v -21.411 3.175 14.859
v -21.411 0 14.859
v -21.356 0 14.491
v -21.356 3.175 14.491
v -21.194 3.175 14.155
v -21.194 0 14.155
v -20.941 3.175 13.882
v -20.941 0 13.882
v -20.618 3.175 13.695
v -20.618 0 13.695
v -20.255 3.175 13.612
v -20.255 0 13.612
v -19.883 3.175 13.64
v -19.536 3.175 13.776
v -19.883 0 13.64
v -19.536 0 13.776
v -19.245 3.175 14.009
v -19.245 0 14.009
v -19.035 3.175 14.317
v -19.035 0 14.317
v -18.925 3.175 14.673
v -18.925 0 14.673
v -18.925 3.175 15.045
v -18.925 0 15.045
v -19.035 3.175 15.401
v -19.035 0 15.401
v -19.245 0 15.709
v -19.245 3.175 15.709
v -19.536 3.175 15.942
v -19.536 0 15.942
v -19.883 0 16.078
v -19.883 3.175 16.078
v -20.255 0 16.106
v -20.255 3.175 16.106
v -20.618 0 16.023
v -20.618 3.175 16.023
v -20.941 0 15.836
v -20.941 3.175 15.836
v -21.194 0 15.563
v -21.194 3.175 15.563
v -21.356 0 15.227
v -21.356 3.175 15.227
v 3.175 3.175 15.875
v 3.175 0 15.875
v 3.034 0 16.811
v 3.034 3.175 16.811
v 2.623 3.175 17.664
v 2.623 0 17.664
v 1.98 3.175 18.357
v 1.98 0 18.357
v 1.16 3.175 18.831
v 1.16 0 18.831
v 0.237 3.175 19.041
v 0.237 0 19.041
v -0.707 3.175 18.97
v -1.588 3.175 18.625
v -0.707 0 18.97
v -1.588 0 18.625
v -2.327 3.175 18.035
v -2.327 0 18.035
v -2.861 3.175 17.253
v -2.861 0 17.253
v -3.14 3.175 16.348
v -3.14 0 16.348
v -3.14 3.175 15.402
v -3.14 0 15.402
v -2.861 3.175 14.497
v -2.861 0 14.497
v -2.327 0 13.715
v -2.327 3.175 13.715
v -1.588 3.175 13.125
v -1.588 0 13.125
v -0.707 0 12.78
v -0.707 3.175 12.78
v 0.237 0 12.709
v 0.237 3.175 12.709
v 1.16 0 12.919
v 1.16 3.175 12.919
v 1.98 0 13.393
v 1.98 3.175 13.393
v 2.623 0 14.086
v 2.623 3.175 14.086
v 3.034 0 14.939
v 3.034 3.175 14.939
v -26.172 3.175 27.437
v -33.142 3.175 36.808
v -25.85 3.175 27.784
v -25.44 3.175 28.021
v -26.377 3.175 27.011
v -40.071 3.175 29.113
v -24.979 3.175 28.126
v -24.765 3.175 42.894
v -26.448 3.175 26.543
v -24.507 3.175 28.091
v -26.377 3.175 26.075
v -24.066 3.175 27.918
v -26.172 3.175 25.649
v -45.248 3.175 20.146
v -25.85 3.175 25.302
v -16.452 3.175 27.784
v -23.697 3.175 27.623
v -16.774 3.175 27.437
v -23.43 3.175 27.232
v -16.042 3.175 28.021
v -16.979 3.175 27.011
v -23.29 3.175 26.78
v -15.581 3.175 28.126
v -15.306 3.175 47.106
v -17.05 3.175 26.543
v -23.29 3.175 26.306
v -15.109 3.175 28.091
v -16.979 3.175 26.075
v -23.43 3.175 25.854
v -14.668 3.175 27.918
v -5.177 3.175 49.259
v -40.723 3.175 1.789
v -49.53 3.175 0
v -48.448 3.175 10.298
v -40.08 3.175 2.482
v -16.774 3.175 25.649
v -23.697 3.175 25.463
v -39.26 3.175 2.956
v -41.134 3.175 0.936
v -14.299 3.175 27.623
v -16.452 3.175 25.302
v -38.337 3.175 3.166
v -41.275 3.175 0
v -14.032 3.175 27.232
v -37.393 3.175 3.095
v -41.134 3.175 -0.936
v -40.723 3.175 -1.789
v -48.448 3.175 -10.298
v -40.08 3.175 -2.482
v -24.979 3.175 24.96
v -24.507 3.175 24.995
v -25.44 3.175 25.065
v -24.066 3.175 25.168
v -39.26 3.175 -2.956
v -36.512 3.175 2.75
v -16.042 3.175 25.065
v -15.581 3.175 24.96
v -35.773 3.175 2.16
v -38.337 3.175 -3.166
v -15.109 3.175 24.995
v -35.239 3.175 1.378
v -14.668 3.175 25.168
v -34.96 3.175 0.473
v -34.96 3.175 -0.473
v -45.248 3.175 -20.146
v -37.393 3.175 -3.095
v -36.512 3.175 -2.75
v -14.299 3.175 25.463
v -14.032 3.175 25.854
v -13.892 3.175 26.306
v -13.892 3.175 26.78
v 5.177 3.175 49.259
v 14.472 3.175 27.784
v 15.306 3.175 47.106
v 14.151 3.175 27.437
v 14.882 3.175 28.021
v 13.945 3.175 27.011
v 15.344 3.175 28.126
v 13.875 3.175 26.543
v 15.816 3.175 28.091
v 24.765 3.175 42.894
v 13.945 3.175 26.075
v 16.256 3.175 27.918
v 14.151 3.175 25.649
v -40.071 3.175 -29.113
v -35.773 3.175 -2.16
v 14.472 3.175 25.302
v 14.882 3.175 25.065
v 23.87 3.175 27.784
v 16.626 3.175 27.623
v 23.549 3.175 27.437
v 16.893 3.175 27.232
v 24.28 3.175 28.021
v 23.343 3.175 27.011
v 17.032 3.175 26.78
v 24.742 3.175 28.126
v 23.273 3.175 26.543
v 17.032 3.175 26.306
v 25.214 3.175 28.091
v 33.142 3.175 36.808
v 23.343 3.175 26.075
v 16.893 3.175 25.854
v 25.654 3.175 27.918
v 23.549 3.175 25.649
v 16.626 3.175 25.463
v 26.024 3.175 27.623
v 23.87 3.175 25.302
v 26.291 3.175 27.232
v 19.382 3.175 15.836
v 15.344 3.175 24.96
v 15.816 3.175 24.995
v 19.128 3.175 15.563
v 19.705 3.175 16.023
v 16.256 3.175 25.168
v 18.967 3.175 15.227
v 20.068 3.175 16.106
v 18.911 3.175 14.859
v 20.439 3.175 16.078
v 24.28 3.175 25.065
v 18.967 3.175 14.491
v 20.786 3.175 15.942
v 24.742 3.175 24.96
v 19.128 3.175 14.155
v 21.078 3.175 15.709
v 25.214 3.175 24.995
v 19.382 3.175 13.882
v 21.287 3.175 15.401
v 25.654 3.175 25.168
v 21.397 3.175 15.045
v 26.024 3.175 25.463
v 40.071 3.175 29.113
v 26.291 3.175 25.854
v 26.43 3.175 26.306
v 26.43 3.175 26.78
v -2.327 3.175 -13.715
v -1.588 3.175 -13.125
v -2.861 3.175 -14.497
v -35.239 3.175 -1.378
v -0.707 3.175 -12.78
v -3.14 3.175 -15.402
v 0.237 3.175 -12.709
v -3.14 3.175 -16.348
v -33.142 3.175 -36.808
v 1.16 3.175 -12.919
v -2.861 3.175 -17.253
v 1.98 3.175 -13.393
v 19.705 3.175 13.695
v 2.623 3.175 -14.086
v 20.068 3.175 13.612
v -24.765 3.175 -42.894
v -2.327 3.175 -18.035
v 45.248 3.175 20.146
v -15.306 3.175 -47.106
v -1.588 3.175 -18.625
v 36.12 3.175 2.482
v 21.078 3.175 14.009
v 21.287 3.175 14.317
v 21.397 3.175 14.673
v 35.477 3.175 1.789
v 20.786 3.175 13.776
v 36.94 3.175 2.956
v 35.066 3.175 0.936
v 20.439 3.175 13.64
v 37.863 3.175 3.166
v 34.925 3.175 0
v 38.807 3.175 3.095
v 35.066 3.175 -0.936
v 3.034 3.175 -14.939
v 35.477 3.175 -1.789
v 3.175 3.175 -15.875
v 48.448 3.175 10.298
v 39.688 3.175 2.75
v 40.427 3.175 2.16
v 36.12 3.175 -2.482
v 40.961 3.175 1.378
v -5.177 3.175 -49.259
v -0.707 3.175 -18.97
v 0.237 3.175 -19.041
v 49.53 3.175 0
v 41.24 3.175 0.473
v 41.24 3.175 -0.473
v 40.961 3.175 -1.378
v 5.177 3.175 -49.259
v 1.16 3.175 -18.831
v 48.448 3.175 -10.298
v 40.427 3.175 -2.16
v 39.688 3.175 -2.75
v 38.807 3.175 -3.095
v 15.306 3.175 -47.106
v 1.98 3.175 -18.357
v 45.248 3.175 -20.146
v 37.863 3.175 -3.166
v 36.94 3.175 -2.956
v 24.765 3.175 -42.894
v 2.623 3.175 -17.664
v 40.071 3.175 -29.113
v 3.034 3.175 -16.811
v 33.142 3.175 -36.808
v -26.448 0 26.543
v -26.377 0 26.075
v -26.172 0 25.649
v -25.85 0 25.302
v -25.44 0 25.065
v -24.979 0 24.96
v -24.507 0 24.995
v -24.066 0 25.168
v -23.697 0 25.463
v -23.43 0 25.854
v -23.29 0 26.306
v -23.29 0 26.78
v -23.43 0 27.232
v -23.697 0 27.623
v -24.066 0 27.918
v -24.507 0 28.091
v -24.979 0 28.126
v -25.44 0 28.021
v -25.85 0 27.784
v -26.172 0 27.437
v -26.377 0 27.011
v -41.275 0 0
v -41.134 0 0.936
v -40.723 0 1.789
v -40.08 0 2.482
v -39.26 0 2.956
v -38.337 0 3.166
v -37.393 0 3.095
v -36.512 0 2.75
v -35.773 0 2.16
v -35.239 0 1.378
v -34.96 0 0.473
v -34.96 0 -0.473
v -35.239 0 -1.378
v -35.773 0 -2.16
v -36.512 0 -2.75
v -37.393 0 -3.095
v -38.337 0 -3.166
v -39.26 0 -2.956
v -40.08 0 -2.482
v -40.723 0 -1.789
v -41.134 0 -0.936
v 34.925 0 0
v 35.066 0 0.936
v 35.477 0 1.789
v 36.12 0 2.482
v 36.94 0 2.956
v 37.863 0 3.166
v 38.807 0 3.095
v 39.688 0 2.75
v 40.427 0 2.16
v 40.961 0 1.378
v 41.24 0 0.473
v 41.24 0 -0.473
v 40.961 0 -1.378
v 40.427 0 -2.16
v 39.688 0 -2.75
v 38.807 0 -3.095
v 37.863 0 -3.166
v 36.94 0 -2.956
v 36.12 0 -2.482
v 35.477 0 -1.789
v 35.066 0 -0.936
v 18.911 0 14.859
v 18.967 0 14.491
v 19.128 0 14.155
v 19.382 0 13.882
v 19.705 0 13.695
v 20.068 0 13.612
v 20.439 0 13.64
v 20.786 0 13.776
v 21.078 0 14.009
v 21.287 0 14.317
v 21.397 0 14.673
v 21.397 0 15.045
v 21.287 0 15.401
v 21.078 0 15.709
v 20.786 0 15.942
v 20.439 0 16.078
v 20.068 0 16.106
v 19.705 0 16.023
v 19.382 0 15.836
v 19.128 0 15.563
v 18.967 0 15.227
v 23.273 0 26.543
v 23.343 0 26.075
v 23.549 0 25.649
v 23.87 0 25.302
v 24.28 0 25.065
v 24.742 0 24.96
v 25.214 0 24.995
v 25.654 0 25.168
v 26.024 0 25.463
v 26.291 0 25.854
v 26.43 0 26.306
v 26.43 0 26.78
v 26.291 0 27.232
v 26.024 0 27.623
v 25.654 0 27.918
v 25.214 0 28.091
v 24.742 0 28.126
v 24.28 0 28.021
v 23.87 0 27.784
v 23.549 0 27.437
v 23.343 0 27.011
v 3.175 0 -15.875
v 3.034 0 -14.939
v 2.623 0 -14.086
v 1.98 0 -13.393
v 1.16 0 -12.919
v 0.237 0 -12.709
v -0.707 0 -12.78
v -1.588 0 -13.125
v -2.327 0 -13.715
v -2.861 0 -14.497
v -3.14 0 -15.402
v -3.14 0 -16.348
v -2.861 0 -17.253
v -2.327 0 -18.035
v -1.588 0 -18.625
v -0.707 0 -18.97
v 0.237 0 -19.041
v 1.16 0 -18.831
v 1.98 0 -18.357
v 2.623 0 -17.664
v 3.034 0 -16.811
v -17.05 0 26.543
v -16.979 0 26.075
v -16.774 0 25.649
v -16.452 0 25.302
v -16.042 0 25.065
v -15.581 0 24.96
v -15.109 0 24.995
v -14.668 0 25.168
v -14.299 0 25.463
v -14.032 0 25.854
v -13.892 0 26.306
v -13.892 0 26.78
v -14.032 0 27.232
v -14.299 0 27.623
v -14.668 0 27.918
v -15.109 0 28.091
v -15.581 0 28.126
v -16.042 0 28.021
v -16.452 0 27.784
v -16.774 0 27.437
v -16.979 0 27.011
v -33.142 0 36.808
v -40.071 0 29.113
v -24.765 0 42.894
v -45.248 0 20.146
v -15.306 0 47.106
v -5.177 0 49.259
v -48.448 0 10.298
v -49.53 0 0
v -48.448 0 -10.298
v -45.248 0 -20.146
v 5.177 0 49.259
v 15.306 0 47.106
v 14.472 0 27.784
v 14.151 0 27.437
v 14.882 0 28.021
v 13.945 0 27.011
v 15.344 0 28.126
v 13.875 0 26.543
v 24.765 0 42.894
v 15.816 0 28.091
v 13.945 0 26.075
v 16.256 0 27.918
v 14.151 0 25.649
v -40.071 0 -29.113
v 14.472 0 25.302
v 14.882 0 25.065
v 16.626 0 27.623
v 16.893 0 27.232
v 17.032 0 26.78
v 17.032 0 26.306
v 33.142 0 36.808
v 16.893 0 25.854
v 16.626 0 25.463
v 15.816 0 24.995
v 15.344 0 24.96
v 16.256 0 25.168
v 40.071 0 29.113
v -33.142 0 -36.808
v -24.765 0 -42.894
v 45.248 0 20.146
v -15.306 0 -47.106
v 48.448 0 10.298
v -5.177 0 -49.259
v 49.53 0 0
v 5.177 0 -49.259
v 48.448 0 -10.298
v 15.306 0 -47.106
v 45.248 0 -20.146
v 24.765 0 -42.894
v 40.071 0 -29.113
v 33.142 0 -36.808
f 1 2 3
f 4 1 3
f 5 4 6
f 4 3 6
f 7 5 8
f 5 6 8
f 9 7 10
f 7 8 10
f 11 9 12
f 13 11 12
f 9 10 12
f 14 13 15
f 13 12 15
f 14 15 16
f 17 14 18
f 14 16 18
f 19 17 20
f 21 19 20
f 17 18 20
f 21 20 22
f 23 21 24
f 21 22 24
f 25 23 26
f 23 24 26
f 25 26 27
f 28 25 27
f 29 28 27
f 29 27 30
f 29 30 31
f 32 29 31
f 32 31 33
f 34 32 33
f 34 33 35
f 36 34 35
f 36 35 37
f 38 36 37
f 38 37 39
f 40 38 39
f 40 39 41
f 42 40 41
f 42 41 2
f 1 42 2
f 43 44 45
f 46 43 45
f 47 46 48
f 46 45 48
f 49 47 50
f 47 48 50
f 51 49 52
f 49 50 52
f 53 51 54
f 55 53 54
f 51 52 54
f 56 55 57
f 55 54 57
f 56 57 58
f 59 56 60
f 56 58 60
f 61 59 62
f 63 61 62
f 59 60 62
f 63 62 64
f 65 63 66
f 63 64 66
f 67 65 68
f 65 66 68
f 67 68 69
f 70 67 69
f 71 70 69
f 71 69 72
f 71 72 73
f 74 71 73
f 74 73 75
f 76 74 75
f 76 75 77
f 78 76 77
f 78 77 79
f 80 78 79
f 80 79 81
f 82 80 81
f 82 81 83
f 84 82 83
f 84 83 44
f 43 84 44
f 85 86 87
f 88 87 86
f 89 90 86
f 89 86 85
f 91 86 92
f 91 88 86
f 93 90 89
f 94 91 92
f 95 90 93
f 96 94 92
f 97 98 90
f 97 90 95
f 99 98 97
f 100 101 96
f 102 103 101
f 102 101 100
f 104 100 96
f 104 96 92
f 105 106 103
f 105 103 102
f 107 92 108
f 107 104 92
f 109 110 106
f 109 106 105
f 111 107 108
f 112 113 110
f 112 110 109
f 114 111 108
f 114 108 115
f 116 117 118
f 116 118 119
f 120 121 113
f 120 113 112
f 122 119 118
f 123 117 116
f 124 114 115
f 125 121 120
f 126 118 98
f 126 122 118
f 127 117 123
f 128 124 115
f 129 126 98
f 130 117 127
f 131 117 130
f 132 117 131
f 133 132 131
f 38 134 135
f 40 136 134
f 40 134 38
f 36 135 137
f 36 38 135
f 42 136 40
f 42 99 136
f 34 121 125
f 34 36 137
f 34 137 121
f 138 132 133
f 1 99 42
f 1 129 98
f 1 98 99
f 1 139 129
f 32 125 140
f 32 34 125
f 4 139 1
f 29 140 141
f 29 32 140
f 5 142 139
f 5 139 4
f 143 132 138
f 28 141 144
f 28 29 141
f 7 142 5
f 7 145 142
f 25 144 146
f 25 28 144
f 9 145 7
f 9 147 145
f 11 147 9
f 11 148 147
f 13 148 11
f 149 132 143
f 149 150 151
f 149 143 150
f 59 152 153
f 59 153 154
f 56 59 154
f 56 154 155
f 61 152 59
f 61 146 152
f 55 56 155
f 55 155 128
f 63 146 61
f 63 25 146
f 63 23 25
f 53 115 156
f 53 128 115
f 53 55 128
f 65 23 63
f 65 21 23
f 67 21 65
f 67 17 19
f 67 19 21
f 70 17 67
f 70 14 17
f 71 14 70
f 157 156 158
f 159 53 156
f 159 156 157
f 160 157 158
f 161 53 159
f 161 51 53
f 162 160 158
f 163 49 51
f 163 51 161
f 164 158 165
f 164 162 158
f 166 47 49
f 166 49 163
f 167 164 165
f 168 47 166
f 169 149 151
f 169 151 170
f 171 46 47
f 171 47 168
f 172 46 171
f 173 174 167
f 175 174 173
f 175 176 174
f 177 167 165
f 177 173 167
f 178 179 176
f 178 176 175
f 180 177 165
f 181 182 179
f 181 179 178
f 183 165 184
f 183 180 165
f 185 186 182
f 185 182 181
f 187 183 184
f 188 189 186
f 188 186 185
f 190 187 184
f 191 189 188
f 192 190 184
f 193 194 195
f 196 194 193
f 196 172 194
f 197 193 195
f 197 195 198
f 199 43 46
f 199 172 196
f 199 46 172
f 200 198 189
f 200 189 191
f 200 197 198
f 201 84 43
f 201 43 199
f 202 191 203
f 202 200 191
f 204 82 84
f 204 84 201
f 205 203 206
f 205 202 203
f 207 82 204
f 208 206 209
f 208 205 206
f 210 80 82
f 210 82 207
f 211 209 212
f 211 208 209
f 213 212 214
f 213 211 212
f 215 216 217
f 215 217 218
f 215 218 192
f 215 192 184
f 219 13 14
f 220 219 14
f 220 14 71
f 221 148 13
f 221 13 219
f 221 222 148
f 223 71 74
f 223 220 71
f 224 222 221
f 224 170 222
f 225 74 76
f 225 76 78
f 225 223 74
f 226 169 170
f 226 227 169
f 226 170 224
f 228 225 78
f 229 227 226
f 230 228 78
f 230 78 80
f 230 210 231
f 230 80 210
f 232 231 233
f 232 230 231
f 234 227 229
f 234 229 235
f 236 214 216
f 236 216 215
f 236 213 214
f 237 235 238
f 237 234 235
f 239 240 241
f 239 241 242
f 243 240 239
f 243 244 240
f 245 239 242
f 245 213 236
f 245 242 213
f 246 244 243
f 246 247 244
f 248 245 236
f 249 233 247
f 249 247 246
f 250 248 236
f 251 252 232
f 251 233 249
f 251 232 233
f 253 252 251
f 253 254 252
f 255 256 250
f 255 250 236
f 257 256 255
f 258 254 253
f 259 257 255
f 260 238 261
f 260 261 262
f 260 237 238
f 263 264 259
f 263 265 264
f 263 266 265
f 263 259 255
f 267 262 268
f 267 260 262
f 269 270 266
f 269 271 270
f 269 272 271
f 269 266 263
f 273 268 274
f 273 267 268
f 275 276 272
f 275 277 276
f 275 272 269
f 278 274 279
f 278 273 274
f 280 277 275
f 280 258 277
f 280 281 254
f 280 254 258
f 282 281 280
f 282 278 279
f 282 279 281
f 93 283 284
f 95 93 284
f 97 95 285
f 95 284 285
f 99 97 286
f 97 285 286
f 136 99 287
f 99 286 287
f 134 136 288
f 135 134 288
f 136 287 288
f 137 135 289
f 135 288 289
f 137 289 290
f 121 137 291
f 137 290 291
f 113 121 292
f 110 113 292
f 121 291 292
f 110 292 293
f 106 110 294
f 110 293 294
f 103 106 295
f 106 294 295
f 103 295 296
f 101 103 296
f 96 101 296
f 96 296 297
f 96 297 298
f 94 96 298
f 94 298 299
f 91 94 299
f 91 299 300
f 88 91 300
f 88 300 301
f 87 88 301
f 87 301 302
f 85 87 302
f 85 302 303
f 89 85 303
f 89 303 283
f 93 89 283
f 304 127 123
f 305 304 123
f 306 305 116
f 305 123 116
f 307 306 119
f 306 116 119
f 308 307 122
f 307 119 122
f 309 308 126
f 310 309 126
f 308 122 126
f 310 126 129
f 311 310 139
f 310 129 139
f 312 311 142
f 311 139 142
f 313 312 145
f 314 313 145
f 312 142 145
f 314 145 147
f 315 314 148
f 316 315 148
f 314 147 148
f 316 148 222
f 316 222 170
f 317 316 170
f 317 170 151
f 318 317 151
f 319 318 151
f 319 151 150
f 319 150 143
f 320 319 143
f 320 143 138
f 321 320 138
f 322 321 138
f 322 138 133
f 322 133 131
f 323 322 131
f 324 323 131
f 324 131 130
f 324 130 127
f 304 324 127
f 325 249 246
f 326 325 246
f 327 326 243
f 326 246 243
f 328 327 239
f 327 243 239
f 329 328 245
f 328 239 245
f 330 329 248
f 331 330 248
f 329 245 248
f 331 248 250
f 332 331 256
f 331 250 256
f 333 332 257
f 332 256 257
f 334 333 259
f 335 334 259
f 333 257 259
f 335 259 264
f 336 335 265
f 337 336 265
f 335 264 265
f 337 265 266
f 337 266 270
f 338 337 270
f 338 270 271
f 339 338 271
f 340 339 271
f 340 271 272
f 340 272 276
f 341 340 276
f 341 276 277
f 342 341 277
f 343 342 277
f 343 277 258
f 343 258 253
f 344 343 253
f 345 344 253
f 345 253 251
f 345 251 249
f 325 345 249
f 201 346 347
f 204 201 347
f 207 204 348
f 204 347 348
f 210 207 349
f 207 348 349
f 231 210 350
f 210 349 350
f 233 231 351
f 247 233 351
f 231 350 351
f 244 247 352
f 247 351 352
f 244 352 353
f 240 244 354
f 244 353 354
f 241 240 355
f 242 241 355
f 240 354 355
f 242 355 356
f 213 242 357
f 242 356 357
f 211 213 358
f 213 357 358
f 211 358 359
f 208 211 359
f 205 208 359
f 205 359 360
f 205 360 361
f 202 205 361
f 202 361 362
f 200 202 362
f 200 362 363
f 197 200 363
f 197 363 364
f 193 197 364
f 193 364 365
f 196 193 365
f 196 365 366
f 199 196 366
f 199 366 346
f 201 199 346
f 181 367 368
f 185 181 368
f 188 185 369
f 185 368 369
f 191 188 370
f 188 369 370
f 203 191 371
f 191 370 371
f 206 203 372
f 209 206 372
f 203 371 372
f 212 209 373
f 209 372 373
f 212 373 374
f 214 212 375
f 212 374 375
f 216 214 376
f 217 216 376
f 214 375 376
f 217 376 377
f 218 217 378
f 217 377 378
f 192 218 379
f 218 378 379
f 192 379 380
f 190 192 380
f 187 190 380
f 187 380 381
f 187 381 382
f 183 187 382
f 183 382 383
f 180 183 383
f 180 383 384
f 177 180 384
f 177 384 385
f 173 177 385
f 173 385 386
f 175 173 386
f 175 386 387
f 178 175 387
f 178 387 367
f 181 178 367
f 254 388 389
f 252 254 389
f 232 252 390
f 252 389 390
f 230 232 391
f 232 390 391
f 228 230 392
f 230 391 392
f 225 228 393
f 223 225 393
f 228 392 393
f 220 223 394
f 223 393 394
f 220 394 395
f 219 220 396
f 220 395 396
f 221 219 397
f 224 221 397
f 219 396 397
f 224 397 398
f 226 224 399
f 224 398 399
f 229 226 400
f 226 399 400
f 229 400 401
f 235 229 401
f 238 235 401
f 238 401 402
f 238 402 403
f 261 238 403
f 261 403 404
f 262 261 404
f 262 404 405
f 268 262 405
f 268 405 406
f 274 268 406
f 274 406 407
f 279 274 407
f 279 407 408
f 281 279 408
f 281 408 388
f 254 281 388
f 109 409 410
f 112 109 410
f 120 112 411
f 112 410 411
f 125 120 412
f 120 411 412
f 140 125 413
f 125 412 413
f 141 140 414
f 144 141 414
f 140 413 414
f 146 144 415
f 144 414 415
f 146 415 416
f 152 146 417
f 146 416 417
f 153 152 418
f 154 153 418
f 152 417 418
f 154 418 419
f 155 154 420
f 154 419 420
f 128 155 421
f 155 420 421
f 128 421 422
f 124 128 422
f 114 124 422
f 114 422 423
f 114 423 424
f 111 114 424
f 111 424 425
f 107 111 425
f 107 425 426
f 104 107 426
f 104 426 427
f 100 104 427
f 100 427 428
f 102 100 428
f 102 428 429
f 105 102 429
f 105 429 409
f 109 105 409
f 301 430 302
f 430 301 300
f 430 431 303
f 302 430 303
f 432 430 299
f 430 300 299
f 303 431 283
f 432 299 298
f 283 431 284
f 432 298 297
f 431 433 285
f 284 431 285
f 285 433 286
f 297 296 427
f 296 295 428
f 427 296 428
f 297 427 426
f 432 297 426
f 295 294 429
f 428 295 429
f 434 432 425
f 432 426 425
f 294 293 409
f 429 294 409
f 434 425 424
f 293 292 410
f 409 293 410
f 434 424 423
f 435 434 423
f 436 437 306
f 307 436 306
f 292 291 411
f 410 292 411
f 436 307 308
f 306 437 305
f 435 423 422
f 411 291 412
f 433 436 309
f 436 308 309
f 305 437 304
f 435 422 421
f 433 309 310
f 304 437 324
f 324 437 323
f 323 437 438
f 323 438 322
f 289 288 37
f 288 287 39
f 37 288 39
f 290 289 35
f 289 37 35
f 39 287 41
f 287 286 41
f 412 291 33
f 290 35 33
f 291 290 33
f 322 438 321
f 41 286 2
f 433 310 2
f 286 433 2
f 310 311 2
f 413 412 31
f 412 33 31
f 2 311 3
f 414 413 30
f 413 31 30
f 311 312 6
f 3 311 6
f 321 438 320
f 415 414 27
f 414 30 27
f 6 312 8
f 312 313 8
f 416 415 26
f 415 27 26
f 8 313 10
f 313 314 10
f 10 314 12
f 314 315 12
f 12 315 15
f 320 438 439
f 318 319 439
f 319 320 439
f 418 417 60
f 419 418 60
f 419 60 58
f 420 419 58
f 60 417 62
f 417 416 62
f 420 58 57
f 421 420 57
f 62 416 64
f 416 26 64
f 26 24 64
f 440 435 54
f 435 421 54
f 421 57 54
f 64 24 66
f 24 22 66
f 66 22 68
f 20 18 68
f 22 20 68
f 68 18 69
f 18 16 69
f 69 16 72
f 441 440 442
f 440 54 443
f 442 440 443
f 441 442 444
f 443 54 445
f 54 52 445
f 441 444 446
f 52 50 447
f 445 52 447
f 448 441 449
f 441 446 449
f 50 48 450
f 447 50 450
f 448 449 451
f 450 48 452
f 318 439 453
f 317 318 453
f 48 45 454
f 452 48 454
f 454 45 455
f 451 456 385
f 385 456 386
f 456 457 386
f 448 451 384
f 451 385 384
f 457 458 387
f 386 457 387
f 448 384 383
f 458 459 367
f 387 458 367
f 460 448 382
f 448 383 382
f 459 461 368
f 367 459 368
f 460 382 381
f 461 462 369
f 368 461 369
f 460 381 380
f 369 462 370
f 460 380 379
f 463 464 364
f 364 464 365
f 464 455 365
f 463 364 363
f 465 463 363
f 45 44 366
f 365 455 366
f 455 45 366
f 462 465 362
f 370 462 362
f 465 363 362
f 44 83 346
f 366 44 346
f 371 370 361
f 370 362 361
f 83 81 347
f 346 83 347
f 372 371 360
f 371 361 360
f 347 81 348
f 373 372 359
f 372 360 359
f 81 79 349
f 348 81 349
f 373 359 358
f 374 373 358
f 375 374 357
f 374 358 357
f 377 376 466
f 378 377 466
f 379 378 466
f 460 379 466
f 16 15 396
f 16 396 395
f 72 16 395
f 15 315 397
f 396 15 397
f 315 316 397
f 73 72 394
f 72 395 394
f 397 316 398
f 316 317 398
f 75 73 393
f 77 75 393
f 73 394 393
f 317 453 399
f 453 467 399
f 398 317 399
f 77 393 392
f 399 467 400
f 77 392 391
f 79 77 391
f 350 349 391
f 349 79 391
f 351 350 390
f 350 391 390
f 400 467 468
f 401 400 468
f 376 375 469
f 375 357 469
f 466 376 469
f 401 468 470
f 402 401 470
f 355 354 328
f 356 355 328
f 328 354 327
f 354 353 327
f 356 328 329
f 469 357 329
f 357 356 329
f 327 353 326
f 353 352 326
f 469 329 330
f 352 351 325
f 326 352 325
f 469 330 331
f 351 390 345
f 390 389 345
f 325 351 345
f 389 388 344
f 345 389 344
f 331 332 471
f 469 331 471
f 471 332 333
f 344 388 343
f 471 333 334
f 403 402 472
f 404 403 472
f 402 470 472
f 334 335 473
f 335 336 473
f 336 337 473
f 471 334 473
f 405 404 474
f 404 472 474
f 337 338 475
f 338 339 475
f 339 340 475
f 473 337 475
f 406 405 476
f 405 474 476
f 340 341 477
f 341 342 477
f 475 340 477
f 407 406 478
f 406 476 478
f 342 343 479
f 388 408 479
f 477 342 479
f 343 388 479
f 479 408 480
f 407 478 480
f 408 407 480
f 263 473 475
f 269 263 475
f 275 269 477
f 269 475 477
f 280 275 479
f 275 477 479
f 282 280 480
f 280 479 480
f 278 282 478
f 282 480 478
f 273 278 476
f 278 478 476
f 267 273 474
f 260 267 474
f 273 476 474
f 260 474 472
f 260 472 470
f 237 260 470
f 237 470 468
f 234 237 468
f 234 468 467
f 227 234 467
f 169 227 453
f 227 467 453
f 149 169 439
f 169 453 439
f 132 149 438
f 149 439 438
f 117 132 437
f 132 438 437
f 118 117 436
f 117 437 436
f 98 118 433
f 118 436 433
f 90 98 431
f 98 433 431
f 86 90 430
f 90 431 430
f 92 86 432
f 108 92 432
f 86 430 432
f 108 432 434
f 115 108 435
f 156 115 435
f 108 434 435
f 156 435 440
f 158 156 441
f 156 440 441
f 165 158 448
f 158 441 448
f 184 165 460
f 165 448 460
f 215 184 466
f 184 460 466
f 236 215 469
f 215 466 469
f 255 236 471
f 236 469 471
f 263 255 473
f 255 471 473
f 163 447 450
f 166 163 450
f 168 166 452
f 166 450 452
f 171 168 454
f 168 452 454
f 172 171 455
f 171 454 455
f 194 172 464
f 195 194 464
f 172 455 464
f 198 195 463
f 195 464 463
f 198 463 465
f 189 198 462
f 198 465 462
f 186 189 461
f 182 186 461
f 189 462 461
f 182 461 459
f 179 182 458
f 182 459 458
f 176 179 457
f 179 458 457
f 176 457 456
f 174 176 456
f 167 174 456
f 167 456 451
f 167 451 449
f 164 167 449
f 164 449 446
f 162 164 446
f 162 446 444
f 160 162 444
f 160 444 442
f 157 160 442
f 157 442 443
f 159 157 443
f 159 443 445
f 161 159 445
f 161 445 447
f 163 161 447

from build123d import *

# Parameters (mm, degrees)
SKETCH1_R           = 49.53
BOSS_EXTRUDE1_DEPTH = 3.175
SKETCH2_R           = 3.175
CUT_EXTRUDE1_DEPTH  = 263.398
SKETCH3_R           = 3.175
CUT_EXTRUDE2_DEPTH  = 25.4
SKETCH4_R           = 1.5875
SKETCH4_R_2         = 1.25
CUT_EXTRUDE3_DEPTH  = 50.8


with BuildPart() as part:
    # Sketch1 → Boss-Extrude1 (new body)
    with BuildSketch(Plane(origin=(0, 0, 0), x_dir=(1, 0, 0), z_dir=(0, 1, 0))):
        Circle(SKETCH1_R)
    extrude(amount=BOSS_EXTRUDE1_DEPTH)

    # Sketch2 → Cut-Extrude1 (cut)
    with BuildSketch(Plane(origin=(-55.039702575, 234.95, -116.088398355), x_dir=(-1, 0, 0), z_dir=(0, 1, 0))):
        with Locations((-93.139702575, 116.088398355)):
            Circle(SKETCH2_R)
        with Locations((-16.939702575, 116.088398355)):
            Circle(SKETCH2_R)
    extrude(amount=-CUT_EXTRUDE1_DEPTH, mode=Mode.SUBTRACT)

    # Sketch3 → Cut-Extrude2 (cut)
    with BuildSketch(Plane(origin=(-28.264398128, 0, -82.371298873), x_dir=(1, 0, 0), z_dir=(0, -1, 0))):
        with Locations((28.264398128, 98.246298873)):
            Circle(SKETCH3_R)
        with Locations((28.264398128, 66.496298873)):
            Circle(SKETCH3_R)
    extrude(amount=-CUT_EXTRUDE2_DEPTH, mode=Mode.SUBTRACT)

    # Sketch4 → Cut-Extrude3 (cut)
    with BuildSketch(Plane(origin=(-28.264398128, 0, -82.371298873), x_dir=(-1, 0, 0), z_dir=(0, -1, 0))):
        with Locations((-3.404148128, -108.914298873)):
            Circle(SKETCH4_R)
        with Locations((-12.802148128, -108.914298873)):
            Circle(SKETCH4_R)
        with Locations((-43.726648128, -108.914298873)):
            Circle(SKETCH4_R)
        with Locations((-53.124648128, -108.914298873)):
            Circle(SKETCH4_R)
        with Locations((-8.103148128, -97.230298873)):
            Circle(SKETCH4_R_2)
        with Locations((-48.425648128, -97.230298873)):
            Circle(SKETCH4_R_2)
    extrude(amount=-CUT_EXTRUDE3_DEPTH, mode=Mode.SUBTRACT)


solid = part.part
